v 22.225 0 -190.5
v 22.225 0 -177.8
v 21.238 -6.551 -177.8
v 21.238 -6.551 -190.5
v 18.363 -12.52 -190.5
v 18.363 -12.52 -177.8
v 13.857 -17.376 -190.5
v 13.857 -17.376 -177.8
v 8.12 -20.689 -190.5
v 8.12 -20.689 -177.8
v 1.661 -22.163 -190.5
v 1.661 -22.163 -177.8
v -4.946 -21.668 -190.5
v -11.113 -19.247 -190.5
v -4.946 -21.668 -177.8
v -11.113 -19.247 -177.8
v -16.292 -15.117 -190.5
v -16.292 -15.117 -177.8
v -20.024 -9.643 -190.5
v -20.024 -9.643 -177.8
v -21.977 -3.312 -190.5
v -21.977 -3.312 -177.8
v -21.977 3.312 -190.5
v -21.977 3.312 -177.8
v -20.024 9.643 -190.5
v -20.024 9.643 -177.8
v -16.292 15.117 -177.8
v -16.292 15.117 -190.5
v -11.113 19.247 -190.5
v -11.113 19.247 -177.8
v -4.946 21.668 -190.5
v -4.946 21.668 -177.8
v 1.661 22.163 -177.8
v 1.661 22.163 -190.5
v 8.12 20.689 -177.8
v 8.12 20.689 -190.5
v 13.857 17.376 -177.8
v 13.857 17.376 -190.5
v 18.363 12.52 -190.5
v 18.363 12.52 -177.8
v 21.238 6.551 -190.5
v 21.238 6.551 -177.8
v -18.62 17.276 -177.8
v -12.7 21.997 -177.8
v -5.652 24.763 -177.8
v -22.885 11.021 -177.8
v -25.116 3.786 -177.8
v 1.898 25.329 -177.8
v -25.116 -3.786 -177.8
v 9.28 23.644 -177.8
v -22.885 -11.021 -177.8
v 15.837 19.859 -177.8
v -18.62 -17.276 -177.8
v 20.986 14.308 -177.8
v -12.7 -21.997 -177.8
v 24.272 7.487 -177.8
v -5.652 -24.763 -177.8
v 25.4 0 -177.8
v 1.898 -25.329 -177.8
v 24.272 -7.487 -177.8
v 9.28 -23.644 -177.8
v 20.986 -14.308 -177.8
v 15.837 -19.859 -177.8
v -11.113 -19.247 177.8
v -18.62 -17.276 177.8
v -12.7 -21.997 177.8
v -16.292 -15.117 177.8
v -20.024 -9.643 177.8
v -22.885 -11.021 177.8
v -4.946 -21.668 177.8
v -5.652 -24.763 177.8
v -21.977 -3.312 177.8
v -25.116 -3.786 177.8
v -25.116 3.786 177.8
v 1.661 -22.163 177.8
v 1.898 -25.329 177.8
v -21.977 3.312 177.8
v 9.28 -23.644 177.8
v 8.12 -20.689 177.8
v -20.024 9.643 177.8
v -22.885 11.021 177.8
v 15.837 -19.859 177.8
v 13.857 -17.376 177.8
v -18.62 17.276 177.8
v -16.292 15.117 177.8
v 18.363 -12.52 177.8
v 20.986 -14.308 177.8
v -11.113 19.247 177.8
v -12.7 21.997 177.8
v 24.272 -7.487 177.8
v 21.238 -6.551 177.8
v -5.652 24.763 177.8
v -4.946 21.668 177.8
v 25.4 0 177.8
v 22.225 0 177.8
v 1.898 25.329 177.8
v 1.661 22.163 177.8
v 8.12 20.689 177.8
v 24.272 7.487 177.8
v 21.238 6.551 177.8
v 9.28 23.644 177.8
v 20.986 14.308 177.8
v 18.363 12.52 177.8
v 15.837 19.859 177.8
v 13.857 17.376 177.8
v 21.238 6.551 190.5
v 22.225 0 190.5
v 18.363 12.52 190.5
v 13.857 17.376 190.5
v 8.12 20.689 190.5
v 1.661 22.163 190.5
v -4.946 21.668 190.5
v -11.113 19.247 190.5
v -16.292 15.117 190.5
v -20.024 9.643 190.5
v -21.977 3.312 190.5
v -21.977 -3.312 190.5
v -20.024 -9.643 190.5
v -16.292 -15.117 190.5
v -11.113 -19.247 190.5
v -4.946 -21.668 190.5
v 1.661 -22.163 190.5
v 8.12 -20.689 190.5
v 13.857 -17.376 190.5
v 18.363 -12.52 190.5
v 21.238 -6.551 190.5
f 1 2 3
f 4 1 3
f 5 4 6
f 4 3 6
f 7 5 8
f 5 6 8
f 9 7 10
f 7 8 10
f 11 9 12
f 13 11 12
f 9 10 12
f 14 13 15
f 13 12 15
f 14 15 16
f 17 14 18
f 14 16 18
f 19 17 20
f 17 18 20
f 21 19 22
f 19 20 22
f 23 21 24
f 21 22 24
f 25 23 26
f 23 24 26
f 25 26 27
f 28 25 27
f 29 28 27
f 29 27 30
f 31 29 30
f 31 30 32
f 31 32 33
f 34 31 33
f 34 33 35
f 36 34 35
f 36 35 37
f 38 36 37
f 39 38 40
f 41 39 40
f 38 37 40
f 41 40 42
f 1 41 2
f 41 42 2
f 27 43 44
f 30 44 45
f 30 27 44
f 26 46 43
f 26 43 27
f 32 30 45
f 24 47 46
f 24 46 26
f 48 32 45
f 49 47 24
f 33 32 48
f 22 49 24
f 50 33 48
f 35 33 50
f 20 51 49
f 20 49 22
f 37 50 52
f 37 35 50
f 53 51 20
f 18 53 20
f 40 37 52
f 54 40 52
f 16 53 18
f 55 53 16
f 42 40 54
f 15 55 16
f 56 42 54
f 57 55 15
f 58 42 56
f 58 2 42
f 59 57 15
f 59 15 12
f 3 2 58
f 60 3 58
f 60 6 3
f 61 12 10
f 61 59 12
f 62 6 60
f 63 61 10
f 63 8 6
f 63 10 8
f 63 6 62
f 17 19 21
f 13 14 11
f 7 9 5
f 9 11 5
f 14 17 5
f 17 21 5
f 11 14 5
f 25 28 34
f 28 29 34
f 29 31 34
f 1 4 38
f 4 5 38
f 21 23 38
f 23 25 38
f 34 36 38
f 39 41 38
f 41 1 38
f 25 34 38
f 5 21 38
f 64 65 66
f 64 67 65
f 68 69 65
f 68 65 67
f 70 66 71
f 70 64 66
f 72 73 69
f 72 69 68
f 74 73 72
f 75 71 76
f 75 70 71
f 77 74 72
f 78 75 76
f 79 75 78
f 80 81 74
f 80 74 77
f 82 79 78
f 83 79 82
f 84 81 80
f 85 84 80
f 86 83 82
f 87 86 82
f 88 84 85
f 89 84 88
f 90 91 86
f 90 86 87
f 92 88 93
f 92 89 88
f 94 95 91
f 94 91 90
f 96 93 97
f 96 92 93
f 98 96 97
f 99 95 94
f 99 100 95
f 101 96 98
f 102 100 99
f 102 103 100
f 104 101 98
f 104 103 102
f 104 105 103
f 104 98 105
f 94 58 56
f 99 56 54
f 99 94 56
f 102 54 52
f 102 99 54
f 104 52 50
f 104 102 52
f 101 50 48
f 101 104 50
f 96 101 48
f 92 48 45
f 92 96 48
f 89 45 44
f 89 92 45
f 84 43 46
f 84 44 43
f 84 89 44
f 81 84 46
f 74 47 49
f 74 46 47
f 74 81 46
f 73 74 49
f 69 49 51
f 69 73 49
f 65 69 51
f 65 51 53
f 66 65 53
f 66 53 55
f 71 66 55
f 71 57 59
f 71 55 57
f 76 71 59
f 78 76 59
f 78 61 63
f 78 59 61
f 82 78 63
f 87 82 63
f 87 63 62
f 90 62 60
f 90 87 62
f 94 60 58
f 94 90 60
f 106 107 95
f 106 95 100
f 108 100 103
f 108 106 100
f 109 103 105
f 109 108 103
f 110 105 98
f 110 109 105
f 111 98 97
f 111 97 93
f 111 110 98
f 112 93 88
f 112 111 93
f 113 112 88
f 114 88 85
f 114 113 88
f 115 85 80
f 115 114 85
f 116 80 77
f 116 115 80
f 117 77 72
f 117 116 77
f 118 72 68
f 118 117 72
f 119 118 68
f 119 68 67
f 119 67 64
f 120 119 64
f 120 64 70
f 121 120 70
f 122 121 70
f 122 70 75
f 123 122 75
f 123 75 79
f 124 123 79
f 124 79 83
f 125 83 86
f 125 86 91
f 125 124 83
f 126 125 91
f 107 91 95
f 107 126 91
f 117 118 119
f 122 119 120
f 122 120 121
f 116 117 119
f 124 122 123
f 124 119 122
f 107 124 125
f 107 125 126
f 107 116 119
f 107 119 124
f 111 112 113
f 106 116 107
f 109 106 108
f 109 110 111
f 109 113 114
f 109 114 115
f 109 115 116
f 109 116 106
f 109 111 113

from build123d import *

# Parameters (mm, degrees)
BOSS_EXTRUDE1_START = 190.5
SKETCH1_R           = 25.4
BOSS_EXTRUDE1_DEPTH = 381
SKETCH2_R           = 25.4
SKETCH2_R_2         = 22.225
CUT_EXTRUDE1_DEPTH  = 12.7
CUT_EXTRUDE2_START  = -12.7
SKETCH3_R           = 25.4
SKETCH3_R_2         = 22.225
CUT_EXTRUDE2_DEPTH  = 12.7


with BuildPart() as part:
    # Sketch1 → Boss-Extrude1 (new body)
    with BuildSketch(Plane.XY.offset(BOSS_EXTRUDE1_START)):
        Circle(SKETCH1_R)
    extrude(amount=-BOSS_EXTRUDE1_DEPTH)

    # Sketch2 → Cut-Extrude1 (cut)
    with BuildSketch(Plane.XY.offset(190.5)):
        Circle(SKETCH2_R)
        Circle(SKETCH2_R_2, mode=Mode.SUBTRACT)
    extrude(amount=-CUT_EXTRUDE1_DEPTH, mode=Mode.SUBTRACT)

    # Sketch3 → Cut-Extrude2 (cut)
    with BuildSketch(Plane(origin=(0, 0, -190.5), x_dir=(-1, 0, 0), z_dir=(0, 0, -1)).offset(CUT_EXTRUDE2_START)):
        with Locations(Location((0, 0, 0), (0, 0, 180))):
            Circle(SKETCH3_R)
        with Locations(Location((0, 0, 0), (0, 0, 180))):
            Circle(SKETCH3_R_2, mode=Mode.SUBTRACT)
    extrude(amount=CUT_EXTRUDE2_DEPTH, mode=Mode.SUBTRACT)


solid = part.part
